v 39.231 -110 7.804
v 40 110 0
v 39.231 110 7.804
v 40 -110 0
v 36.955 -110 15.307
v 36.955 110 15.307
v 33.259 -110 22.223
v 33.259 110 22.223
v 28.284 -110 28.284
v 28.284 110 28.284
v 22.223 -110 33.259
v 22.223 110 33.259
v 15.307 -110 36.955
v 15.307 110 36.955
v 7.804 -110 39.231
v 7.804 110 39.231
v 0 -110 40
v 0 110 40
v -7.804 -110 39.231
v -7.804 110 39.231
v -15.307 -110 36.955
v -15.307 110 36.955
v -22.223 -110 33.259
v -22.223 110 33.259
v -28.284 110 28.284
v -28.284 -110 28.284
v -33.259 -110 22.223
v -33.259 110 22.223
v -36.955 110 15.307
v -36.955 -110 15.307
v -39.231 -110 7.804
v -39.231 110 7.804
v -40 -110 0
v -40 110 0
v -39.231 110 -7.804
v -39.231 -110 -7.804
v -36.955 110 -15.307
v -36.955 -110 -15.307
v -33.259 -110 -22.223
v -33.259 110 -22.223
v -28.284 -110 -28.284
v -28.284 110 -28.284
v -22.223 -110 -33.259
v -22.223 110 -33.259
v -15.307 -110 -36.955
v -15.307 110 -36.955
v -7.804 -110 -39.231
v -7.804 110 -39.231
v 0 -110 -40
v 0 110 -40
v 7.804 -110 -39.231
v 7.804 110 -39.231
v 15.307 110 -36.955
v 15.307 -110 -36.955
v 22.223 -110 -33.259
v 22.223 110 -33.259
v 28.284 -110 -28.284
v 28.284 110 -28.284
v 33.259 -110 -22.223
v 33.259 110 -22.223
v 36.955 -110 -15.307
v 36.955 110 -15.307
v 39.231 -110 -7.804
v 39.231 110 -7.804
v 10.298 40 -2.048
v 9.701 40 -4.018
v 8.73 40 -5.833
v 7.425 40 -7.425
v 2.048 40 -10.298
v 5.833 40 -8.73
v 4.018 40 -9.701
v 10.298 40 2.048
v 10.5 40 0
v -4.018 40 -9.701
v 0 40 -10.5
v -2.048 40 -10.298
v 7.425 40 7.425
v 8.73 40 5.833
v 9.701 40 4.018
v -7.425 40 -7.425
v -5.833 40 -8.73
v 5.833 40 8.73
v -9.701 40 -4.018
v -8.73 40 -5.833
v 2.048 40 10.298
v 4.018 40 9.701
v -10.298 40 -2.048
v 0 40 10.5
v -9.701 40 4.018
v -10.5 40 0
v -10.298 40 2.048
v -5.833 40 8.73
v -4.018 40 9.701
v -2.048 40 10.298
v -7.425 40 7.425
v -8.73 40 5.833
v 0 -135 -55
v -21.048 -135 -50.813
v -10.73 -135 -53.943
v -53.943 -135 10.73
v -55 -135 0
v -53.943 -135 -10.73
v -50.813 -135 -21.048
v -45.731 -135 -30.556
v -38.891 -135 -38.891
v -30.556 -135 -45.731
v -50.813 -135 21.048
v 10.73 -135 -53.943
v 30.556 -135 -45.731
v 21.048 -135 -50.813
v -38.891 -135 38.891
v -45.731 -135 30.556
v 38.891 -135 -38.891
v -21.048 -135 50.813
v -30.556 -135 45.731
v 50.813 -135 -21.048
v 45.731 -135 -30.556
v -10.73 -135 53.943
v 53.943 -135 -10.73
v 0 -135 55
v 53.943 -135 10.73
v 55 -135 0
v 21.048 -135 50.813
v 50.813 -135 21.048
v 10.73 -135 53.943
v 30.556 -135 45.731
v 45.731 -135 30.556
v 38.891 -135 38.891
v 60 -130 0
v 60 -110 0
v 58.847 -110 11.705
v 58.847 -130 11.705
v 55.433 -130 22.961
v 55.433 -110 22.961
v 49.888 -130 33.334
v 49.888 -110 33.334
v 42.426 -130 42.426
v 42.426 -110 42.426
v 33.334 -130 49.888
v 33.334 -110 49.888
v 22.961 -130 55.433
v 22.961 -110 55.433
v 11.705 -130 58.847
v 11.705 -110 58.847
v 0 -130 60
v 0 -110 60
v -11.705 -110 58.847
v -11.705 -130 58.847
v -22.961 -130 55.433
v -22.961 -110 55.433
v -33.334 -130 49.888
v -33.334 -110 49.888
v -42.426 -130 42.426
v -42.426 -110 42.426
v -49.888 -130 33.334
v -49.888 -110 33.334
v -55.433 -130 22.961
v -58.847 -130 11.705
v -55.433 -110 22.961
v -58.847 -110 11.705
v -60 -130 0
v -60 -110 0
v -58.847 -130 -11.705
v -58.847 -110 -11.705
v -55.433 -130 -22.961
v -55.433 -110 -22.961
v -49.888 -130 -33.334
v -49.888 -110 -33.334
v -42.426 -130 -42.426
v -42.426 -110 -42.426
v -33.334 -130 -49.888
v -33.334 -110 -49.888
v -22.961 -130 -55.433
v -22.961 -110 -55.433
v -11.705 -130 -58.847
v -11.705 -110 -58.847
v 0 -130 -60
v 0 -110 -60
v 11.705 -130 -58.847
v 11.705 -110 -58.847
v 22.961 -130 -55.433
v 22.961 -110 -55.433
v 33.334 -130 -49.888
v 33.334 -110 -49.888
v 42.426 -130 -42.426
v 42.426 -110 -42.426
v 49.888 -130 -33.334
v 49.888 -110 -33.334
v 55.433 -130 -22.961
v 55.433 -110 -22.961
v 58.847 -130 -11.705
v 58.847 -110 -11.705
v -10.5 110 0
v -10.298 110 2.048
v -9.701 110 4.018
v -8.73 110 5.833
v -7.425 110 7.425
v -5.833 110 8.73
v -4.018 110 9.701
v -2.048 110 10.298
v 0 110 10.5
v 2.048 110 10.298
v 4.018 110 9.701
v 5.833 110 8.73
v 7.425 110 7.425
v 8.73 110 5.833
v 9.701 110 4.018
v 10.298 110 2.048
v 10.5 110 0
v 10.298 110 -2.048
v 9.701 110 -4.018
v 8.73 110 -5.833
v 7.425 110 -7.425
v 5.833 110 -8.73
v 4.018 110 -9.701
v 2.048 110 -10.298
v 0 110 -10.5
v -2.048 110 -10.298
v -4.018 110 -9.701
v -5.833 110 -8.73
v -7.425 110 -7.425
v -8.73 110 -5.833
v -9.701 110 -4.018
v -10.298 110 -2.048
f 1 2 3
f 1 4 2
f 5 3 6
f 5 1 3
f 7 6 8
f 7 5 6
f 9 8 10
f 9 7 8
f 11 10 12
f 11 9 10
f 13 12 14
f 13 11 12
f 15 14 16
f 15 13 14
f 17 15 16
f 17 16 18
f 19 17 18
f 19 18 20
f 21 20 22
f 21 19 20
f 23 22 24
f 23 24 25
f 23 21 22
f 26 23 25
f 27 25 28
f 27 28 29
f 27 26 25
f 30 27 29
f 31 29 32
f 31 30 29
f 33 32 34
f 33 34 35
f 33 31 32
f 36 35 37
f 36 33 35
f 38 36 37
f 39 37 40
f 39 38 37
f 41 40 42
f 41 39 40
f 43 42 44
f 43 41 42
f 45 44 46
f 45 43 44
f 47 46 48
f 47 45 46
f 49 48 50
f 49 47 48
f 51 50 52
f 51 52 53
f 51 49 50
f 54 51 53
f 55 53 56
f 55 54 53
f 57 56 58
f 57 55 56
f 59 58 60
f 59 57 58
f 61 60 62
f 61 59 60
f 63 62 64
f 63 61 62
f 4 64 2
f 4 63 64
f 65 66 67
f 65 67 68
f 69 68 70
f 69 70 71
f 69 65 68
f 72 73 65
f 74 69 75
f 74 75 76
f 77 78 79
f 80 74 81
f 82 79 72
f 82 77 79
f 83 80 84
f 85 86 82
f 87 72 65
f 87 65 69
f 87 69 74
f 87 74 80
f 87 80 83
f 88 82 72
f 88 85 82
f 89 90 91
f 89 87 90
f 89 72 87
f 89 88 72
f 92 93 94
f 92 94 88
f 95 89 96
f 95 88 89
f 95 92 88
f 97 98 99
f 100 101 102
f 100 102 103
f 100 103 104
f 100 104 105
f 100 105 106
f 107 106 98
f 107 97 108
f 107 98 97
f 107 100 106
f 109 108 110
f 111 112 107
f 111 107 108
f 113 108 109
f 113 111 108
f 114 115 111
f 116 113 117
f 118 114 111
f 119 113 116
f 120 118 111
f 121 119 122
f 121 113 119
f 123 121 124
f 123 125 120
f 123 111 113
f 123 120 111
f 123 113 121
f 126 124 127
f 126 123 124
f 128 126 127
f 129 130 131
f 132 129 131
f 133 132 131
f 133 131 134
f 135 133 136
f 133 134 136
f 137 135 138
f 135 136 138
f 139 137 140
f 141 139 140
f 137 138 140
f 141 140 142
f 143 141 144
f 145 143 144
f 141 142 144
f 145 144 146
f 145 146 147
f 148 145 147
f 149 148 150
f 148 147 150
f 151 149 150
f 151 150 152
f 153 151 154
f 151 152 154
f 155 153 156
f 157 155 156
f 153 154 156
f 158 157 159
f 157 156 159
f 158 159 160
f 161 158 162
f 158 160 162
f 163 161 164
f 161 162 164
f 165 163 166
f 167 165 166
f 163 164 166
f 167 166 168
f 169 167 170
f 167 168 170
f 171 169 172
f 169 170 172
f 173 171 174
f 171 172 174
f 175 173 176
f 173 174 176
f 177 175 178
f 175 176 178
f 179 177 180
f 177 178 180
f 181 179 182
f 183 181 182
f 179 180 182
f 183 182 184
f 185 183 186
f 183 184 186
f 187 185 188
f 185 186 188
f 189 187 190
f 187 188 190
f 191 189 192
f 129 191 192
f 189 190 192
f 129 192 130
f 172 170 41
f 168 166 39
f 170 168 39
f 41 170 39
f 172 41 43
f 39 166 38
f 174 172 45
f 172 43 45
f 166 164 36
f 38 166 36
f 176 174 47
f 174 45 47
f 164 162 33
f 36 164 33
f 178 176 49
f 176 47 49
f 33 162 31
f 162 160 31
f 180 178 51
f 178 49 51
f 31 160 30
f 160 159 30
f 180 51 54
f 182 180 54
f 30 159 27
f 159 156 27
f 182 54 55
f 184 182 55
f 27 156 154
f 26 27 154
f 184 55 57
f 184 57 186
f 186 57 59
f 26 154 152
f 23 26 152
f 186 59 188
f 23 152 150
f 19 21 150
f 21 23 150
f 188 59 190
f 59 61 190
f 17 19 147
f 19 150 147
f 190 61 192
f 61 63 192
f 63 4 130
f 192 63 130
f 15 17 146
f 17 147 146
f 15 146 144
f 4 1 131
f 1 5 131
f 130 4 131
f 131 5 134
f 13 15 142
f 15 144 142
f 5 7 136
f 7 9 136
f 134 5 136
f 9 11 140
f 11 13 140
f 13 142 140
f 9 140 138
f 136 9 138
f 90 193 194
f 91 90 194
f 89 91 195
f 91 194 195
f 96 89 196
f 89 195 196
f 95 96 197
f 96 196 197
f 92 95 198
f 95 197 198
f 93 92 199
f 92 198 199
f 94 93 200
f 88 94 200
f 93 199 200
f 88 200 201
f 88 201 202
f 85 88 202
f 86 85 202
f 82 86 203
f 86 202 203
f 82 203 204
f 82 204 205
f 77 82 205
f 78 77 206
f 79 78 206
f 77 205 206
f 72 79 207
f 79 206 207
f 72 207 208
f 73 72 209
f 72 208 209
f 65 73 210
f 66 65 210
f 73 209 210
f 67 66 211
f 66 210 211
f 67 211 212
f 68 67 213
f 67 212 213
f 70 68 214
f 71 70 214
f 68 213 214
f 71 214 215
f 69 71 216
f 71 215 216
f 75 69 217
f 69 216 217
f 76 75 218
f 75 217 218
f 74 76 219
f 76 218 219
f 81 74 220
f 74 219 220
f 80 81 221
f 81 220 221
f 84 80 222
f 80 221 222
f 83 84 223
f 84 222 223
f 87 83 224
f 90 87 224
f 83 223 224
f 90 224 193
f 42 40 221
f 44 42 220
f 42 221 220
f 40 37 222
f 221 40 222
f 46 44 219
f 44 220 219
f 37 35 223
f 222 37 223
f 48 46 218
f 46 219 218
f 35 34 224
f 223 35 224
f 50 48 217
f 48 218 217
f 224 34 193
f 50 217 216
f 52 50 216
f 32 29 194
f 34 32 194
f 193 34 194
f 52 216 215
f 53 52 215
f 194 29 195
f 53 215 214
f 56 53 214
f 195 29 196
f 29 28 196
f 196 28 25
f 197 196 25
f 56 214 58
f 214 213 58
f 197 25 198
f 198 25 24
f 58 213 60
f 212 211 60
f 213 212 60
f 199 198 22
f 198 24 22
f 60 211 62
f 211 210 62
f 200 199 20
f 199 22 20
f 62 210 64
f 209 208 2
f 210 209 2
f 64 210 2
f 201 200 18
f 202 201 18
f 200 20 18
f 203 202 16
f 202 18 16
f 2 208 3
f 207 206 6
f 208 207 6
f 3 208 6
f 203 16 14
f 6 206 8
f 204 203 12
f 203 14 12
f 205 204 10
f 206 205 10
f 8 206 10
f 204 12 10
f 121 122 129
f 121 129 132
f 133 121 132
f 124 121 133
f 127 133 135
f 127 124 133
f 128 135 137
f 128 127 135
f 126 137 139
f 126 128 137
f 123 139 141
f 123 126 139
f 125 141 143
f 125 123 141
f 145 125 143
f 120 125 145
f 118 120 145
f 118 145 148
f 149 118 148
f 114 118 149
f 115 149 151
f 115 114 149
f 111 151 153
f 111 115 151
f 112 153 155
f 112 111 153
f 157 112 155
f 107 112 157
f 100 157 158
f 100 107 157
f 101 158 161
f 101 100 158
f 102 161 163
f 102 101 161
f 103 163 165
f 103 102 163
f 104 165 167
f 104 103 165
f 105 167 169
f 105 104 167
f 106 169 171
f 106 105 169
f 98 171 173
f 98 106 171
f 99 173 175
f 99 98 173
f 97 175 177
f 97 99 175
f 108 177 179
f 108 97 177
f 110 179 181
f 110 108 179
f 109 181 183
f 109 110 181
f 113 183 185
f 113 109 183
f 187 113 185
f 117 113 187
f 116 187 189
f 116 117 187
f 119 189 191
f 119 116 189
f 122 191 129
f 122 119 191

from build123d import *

# Parameters (mm, degrees)
F0_R     = 40
F1_DEPTH = 110
F2_R     = 60
F3_DEPTH = 25
F4_SIZE  = 5
F5_R     = 10.5
F6_DEPTH = 70


with BuildPart() as f1:
    # F0 (on Front) → F1 (new body, symmetric)
    with BuildSketch(Plane.XZ):
        Circle(F0_R)
    extrude(amount=F1_DEPTH, both=True)

    # F2 (on face) → F3 (join)
    with BuildSketch(Plane.XZ.offset(110)):
        Circle(F2_R)
    extrude(amount=F3_DEPTH)

    # F4
    f4_edges = [f1.edges().sort_by_distance(p)[0] for p in [
        (-60, -135, 0),
    ]]
    chamfer(f4_edges, length=F4_SIZE)

    # F5 (on face) → F6 (cut)
    with BuildSketch(Plane(origin=(0, 110, 0), x_dir=(-1, 0, 0), z_dir=(0, 1, 0))):
        Circle(F5_R)
    extrude(amount=-F6_DEPTH, mode=Mode.SUBTRACT)


solid = f1.part
